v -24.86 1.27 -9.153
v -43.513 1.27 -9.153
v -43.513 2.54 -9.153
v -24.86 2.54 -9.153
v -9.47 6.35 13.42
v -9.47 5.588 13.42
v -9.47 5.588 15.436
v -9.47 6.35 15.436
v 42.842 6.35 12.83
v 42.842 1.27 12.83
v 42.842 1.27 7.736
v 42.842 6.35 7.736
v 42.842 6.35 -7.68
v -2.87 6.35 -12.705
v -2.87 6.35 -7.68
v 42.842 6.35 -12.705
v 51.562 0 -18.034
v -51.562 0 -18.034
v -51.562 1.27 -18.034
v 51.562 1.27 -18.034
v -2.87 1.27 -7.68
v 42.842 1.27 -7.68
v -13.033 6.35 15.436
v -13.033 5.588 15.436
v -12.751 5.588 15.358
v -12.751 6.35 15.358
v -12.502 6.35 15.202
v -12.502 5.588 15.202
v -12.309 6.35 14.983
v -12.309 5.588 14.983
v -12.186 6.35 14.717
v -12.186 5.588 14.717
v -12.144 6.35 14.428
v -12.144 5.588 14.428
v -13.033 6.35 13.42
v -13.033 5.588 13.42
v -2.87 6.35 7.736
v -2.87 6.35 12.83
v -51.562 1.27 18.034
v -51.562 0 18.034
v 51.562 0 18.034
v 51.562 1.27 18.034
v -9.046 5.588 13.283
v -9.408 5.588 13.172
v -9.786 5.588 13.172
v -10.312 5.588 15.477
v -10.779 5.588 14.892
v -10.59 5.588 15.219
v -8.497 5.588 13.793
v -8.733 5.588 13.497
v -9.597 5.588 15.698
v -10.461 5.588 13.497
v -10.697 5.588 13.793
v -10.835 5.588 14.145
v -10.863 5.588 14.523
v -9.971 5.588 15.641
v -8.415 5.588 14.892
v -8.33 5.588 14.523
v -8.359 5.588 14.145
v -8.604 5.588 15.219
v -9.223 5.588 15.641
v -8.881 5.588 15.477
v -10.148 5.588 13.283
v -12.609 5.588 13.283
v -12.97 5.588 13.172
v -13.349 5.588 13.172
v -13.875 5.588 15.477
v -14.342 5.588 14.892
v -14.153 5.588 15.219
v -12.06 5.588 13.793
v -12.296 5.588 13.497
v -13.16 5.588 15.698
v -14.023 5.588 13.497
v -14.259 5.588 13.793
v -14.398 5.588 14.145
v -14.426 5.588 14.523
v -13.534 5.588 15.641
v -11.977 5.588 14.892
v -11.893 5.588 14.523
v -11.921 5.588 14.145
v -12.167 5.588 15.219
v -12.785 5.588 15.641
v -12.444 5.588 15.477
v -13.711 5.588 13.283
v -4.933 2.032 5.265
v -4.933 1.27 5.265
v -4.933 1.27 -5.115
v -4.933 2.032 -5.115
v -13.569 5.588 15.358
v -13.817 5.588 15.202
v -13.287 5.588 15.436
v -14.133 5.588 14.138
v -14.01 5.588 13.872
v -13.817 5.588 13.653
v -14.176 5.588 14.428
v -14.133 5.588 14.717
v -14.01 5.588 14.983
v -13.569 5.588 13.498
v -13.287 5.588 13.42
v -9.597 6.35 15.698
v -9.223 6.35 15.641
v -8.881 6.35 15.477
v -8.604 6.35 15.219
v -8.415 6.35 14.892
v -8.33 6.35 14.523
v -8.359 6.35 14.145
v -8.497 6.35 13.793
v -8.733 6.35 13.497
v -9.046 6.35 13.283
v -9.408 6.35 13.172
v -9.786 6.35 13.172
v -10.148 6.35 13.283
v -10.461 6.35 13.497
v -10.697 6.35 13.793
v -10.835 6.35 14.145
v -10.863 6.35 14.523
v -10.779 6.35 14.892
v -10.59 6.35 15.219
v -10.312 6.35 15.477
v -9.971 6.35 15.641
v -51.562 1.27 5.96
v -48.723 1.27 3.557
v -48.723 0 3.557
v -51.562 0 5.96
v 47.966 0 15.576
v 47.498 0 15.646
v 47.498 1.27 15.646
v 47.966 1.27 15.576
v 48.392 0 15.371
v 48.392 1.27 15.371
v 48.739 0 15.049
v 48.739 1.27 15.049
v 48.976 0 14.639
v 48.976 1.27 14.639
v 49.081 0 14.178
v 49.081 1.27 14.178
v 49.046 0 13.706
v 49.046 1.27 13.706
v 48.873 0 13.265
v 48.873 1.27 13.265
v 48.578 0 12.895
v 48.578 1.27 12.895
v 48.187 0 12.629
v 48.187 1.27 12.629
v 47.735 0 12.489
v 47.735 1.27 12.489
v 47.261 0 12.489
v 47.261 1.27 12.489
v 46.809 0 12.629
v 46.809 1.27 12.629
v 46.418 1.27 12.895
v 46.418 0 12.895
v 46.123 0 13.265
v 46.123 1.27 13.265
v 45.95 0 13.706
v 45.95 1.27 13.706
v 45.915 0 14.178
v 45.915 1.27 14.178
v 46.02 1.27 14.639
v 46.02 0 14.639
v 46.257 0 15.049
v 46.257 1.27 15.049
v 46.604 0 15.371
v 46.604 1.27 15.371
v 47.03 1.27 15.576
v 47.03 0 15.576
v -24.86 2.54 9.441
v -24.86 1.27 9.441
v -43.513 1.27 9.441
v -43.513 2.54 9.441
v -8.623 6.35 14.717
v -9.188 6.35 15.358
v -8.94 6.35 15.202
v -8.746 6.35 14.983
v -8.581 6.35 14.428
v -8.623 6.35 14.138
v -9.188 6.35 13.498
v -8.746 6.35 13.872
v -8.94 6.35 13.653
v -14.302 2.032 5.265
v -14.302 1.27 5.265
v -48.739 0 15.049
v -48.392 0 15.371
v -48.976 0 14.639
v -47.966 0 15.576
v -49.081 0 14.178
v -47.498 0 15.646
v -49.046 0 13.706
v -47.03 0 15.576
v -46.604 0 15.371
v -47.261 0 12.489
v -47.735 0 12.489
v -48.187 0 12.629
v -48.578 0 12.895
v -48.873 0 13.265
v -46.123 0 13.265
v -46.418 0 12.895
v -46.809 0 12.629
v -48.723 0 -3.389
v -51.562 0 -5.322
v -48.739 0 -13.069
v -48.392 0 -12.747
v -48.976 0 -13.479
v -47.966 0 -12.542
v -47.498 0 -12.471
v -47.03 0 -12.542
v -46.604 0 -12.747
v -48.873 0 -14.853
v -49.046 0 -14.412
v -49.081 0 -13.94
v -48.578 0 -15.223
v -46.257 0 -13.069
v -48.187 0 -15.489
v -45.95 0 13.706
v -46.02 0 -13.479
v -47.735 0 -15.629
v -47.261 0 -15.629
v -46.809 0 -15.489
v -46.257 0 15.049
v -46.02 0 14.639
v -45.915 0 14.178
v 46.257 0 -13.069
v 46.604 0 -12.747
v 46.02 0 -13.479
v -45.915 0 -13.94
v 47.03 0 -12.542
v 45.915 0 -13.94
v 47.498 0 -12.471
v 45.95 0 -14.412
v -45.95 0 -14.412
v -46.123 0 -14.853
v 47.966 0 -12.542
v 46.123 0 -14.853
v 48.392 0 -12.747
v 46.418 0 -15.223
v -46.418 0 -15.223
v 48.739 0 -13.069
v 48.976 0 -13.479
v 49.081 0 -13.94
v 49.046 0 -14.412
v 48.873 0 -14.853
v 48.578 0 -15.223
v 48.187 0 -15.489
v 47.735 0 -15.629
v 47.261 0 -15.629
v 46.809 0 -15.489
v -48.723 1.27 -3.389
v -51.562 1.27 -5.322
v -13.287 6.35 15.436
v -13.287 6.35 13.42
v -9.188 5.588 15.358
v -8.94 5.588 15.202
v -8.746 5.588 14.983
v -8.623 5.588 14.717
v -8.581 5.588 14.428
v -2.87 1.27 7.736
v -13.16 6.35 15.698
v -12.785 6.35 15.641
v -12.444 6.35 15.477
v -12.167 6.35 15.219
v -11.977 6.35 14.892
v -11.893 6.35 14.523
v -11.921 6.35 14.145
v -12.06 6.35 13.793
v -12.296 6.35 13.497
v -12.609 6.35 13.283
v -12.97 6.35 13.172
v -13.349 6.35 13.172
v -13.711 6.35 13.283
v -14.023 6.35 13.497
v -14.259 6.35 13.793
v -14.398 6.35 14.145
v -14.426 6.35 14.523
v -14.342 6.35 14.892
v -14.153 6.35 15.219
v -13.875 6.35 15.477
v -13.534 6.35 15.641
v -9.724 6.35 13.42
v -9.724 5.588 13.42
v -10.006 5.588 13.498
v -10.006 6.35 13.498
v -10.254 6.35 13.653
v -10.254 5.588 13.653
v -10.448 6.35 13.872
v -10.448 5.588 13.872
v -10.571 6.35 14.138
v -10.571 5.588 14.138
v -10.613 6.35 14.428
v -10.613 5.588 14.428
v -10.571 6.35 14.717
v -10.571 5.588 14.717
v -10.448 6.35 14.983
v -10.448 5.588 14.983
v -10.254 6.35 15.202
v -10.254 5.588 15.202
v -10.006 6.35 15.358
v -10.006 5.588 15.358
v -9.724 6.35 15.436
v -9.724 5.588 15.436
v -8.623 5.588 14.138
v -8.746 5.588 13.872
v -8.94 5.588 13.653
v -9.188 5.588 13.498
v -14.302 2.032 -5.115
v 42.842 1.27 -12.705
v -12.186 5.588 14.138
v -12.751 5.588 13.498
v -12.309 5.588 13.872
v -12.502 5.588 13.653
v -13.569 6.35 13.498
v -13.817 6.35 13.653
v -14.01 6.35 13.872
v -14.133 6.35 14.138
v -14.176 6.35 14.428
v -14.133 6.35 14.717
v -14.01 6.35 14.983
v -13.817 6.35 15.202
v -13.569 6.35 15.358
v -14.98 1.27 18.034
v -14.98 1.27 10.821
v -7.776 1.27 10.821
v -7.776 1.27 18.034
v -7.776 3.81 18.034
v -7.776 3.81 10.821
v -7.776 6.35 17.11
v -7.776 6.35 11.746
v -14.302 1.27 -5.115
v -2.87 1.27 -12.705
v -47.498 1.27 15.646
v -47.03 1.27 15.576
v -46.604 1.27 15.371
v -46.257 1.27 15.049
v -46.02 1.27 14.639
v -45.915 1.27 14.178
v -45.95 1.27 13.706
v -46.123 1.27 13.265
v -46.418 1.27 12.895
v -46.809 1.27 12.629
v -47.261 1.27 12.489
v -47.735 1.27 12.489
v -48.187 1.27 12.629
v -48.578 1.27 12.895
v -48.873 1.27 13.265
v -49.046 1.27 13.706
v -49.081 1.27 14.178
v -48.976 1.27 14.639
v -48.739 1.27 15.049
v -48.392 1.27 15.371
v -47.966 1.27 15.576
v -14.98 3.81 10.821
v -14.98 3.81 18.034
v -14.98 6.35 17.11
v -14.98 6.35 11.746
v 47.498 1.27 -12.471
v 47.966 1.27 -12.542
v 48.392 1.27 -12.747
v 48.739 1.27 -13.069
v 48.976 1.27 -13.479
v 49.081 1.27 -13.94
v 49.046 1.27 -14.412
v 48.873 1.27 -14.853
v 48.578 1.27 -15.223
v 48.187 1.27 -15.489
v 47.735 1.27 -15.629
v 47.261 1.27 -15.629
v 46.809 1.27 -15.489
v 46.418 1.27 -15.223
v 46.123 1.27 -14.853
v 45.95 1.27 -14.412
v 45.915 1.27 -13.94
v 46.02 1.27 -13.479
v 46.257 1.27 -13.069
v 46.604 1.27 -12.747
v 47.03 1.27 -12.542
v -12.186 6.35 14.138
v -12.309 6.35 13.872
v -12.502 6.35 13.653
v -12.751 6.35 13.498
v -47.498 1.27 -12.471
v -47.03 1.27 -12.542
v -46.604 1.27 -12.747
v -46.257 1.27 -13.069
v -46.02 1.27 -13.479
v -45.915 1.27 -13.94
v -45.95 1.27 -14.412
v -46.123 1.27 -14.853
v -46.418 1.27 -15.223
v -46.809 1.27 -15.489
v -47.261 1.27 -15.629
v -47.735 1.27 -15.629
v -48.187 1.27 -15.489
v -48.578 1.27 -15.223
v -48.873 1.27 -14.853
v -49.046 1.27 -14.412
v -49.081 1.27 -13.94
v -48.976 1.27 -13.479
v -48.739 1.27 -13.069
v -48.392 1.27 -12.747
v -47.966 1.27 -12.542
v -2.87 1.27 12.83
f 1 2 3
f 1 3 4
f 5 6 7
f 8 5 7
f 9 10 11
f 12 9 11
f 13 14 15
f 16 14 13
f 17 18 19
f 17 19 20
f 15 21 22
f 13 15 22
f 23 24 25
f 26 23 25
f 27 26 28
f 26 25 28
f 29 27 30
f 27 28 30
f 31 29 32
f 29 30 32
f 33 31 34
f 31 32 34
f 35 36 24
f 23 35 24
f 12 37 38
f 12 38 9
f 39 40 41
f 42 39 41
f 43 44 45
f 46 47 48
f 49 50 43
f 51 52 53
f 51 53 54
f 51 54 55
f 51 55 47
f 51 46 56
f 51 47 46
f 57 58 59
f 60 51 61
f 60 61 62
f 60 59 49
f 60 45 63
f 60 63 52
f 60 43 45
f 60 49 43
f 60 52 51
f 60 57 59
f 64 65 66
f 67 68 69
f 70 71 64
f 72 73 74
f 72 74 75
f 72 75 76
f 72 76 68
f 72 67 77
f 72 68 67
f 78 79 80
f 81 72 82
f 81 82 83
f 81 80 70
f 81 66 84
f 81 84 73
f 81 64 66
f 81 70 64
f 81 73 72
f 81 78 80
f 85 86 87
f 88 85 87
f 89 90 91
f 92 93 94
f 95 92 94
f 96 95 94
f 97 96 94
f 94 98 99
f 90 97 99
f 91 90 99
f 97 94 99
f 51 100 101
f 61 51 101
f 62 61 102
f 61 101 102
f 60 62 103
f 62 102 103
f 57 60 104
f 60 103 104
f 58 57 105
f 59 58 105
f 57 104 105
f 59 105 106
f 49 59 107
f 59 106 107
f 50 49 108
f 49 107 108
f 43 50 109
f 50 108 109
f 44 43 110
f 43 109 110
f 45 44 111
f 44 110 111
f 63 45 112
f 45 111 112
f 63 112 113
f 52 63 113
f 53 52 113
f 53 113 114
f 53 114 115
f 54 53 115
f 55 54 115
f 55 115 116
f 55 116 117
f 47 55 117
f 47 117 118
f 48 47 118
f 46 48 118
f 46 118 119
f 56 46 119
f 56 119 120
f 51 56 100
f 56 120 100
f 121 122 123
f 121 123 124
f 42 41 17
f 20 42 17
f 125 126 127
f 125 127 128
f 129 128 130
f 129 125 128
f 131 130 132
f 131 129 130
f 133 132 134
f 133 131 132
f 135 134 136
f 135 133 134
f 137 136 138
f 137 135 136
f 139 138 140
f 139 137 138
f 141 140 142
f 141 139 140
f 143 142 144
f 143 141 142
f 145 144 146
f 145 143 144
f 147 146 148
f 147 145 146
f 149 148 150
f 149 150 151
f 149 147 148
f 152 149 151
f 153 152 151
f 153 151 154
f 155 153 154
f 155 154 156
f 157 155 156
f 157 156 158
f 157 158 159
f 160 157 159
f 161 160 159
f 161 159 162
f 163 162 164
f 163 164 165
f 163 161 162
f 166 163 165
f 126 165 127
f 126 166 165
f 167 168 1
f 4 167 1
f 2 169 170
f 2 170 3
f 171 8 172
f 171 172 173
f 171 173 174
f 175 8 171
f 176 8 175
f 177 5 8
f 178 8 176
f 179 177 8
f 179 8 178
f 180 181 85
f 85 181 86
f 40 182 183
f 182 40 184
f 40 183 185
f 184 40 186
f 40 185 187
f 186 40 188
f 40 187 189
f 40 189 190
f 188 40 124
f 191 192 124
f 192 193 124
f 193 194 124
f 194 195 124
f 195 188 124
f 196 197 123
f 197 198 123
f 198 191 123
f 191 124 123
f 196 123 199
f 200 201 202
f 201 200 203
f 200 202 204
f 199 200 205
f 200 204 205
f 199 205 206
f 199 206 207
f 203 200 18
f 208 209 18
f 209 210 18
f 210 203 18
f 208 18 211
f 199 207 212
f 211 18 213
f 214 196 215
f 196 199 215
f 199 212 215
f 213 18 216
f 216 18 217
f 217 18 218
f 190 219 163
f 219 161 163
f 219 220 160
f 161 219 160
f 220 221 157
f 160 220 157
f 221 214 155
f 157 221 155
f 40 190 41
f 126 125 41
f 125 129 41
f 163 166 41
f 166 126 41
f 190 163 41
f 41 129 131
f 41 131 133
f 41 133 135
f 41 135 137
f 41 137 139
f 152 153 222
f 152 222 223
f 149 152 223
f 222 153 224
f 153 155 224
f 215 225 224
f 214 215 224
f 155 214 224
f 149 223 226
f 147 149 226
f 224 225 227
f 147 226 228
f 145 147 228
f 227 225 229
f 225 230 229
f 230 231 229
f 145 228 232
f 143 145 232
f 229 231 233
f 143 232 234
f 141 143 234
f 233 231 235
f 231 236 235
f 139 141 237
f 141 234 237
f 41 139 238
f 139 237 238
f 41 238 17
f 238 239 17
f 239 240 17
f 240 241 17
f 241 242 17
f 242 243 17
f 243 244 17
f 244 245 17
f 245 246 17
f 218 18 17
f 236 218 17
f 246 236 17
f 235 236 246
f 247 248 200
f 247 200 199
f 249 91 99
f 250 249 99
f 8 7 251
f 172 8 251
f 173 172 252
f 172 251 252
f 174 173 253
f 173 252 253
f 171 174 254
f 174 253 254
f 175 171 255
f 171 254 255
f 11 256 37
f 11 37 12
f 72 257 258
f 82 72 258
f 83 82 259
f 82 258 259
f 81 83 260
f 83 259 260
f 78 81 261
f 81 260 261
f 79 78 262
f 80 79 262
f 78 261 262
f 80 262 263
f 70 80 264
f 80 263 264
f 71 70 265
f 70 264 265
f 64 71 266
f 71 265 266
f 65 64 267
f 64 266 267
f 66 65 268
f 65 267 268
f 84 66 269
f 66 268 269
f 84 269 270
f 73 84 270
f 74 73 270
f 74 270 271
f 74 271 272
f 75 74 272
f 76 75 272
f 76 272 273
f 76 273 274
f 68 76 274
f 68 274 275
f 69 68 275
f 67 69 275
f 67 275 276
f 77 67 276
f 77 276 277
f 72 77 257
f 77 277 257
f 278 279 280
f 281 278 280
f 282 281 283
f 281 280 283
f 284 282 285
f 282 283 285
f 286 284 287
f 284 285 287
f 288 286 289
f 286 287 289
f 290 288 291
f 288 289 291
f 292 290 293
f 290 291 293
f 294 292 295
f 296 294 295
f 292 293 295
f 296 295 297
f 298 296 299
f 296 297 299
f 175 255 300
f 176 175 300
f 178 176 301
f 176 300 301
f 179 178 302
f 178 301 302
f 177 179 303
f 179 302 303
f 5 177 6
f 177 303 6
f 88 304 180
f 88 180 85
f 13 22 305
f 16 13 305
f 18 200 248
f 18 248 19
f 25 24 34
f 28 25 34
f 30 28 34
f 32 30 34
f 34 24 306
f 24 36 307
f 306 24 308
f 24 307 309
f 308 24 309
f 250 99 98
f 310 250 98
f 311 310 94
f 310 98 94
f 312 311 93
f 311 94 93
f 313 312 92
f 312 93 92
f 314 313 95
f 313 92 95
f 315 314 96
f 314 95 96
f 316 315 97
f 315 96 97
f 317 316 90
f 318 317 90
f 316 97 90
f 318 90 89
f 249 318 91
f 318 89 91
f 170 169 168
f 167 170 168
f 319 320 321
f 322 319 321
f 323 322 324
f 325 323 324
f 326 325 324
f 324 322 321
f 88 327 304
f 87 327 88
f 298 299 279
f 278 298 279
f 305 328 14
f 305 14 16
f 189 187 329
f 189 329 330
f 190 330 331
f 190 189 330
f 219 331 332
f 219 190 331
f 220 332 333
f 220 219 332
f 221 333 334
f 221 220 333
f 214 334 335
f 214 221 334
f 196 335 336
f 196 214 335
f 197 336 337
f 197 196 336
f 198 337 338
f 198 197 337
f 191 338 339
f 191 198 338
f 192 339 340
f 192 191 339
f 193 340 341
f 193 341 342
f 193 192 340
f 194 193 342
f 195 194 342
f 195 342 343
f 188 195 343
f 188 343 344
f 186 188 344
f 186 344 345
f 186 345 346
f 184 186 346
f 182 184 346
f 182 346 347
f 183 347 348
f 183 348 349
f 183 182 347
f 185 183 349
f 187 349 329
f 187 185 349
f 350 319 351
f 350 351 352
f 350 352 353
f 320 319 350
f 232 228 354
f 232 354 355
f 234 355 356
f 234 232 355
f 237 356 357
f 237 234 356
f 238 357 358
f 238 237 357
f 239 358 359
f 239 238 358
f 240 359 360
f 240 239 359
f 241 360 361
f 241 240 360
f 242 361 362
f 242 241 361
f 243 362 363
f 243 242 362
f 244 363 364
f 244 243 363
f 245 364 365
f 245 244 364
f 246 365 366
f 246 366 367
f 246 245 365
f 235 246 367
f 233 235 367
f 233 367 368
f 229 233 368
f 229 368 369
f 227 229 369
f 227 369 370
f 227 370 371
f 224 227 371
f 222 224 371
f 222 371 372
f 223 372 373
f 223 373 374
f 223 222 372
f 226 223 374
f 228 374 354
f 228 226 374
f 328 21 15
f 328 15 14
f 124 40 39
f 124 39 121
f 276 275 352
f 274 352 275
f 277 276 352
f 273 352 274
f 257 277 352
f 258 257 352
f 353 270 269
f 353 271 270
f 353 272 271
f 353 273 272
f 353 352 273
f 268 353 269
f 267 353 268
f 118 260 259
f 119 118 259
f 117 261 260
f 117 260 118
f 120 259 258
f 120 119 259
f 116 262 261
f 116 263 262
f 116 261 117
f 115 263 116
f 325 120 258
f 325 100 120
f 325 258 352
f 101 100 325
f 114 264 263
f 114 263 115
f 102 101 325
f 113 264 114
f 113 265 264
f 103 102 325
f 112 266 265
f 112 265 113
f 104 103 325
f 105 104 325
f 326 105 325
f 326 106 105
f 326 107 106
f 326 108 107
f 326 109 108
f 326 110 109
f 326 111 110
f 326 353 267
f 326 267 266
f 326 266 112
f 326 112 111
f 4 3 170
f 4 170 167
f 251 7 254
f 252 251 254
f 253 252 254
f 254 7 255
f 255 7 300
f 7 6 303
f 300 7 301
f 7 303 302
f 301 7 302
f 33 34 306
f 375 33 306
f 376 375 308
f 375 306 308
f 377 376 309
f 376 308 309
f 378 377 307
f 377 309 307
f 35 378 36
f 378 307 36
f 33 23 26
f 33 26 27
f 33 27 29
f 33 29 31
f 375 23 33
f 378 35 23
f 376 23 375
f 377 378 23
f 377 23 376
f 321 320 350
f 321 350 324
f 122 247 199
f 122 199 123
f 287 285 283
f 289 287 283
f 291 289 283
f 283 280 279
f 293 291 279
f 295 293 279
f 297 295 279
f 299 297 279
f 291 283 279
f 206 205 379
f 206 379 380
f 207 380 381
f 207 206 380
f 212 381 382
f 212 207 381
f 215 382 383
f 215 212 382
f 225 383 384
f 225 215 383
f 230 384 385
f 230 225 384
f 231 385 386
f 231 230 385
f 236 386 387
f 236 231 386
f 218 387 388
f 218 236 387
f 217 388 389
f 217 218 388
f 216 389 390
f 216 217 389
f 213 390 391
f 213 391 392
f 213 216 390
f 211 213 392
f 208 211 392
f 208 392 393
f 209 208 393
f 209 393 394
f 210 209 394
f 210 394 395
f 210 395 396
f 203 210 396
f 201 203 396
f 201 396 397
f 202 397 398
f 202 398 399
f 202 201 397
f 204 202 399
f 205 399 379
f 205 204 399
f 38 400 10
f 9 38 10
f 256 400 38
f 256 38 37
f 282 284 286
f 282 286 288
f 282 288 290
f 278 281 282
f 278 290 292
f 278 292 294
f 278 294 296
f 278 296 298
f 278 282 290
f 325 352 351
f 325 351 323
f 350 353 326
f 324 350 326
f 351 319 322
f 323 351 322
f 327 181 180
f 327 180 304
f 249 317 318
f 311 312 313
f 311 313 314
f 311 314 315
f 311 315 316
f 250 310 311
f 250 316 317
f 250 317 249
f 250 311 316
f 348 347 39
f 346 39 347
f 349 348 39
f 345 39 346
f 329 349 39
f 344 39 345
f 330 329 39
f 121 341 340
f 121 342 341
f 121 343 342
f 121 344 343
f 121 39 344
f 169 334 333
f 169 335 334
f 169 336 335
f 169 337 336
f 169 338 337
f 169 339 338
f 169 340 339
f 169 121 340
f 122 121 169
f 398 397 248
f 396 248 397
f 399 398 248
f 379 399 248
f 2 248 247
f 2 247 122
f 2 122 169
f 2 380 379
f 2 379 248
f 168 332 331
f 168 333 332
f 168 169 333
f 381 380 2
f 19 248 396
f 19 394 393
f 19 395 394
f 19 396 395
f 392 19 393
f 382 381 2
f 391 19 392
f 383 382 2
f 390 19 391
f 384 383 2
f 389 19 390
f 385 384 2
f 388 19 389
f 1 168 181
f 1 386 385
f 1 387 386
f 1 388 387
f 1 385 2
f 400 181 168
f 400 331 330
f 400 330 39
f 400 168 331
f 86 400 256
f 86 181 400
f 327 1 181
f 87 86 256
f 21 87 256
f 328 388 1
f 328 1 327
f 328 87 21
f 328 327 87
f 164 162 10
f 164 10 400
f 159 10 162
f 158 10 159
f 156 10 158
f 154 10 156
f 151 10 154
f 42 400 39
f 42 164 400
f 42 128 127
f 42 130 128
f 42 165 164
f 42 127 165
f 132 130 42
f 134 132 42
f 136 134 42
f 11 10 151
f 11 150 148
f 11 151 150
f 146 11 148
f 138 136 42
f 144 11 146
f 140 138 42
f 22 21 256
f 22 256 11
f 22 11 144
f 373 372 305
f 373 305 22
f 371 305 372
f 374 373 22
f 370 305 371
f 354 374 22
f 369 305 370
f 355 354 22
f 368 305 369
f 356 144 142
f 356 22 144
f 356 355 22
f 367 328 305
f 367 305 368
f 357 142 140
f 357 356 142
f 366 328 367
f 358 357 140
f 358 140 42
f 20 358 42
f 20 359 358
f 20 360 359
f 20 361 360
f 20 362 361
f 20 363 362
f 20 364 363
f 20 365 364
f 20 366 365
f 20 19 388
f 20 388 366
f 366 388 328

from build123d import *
from OCP.BRepFilletAPI import BRepFilletAPI_MakeChamfer

# Parameters (mm, degrees)
SKETCH1_W              = 103.124
SKETCH1_H              = 36.068
SKETCH1_R              = 1.5875
BOSS_EXTRUDE2_DEPTH    = 1.27
CUT_EXTRUDE1_DEPTH     = 55.639526901
SKETCH3_W              = 18.652856935
SKETCH3_H              = 18.593657226
BOSS_EXTRUDE3_DEPTH    = 1.27
SKETCH4_W              = 9.368625717
SKETCH4_H              = 10.379996134
BOSS_EXTRUDE4_DEPTH    = 0.762
SKETCH5_W              = 45.711956493
SKETCH5_H              = 5.024947681
SKETCH5_H_2            = 5.093258644
BOSS_EXTRUDE6_DEPTH    = 5.08
SKETCH6_W              = 7.204415031
SKETCH6_H              = 7.212704243
BOSS_EXTRUDE8_DEPTH    = 5.08
CHAMFER1_SIZE          = 2.54
CHAMFER1_SIZE2         = 0.924484395
SKETCH7_R              = 1.27
CUT_EXTRUDE2_DEPTH     = 0.762
BOSS_EXTRUDE10_DEPTH   = 0.762
BOSS_EXTRUDE10_2_DEPTH = 0.762
BOSS_EXTRUDE10_3_DEPTH = 0.762
BOSS_EXTRUDE10_4_DEPTH = 0.762


with BuildPart() as part:
    # Sketch1 → Boss-Extrude2 (new body)
    with BuildSketch(Plane(origin=(0, 0, 0), x_dir=(1, 0, 0), z_dir=(0, 1, 0))):
        Rectangle(SKETCH1_W, SKETCH1_H)
        with Locations(Location((-47.498, 14.0589, 0), (0, 0, 270))):
            Circle(SKETCH1_R, mode=Mode.SUBTRACT)
        with Locations(Location((-47.498, -14.0589, 0), (0, 0, 270))):
            Circle(SKETCH1_R, mode=Mode.SUBTRACT)
        with Locations(Location((47.498, 14.0589, 0), (0, 0, 270))):
            Circle(SKETCH1_R, mode=Mode.SUBTRACT)
        with Locations(Location((47.498, -14.0589, 0), (0, 0, 270))):
            Circle(SKETCH1_R, mode=Mode.SUBTRACT)
    extrude(amount=BOSS_EXTRUDE2_DEPTH)

    # Sketch2 → Cut-Extrude1 (cut, through all)
    with BuildSketch(Plane(origin=(0, 1.27, 0), x_dir=(1, 0, 0), z_dir=(0, 1, 0))):
        Polygon((-51.562, 5.32151794), (-48.722589703, 3.389029994), (-48.722589703, -3.55748073), (-51.562, -5.960033311), align=None)
    extrude(amount=-CUT_EXTRUDE1_DEPTH, mode=Mode.SUBTRACT)

    # Sketch3 → Boss-Extrude3 (add)
    with BuildSketch(Plane(origin=(0, 1.27, 0), x_dir=(1, 0, 0), z_dir=(0, 1, 0))):
        with Locations((-34.186132532, -0.144079079)):
            Rectangle(SKETCH3_W, SKETCH3_H)
    extrude(amount=BOSS_EXTRUDE3_DEPTH)

    # Sketch4 → Boss-Extrude4 (add)
    with BuildSketch(Plane(origin=(0, 1.27, 0), x_dir=(1, 0, 0), z_dir=(0, 1, 0))):
        with Locations((-9.617295377, -0.075408878)):
            Rectangle(SKETCH4_W, SKETCH4_H)
    extrude(amount=BOSS_EXTRUDE4_DEPTH)

    # Sketch5 → Boss-Extrude6 (add)
    with BuildSketch(Plane(origin=(0, 1.27, 0), x_dir=(1, 0, 0), z_dir=(0, 1, 0))):
        with Locations((19.986043909, 10.19248885)):
            Rectangle(SKETCH5_W, SKETCH5_H)
        with Locations((19.986043909, -10.283017769)):
            Rectangle(SKETCH5_W, SKETCH5_H_2)
    extrude(amount=BOSS_EXTRUDE6_DEPTH)


with BuildPart() as body_2:
    # Sketch6 → Boss-Extrude8 (new body)
    with BuildSketch(Plane(origin=(0, 1.27, 0), x_dir=(1, 0, 0), z_dir=(0, 1, 0))):
        with Locations((-11.378263959, -14.427647879)):
            Rectangle(SKETCH6_W, SKETCH6_H)
    extrude(amount=BOSS_EXTRUDE8_DEPTH)

    # Chamfer1: one chamfer whose edges measure the first distance from different faces: ONE call of the kernel's chamfer builder (chamfer() names one face for all edges)
    chamfer1_edges_1 = [body_2.edges().sort_by_distance(p)[0] for p in [
        (-11.378263958, 6.35, 10.821295757),
    ]]
    chamfer1_side_1 = [body_2.faces().sort_by_distance(p)[0] for p in [
        (-11.378263958, 3.81, 10.821295757),
    ]]
    chamfer1_edges_2 = [body_2.edges().sort_by_distance(p)[0] for p in [
        (-11.378263958, 6.35, 18.034),
    ]]
    chamfer1_side_2 = [body_2.faces().sort_by_distance(p)[0] for p in [
        (-11.378263958, 3.81, 18.034),
    ]]
    chamfer1 = BRepFilletAPI_MakeChamfer(body_2.part.solid().wrapped)
    for e in chamfer1_edges_1:
        chamfer1.Add(CHAMFER1_SIZE, CHAMFER1_SIZE2, e.wrapped, chamfer1_side_1[0].wrapped)  # the first distance lies on this face
    for e in chamfer1_edges_2:
        chamfer1.Add(CHAMFER1_SIZE, CHAMFER1_SIZE2, e.wrapped, chamfer1_side_2[0].wrapped)  # the first distance lies on this face
    add(Compound.cast(chamfer1.Shape()), mode=Mode.REPLACE)

    # Sketch7 → Cut-Extrude2 (cut)
    with BuildSketch(Plane(origin=(0, 6.35, 0), x_dir=(1, 0, 0), z_dir=(0, 1, 0))):
        with Locations(Location((-13.159630139, -14.427647879, 0), (0, 0, 270))):
            Circle(SKETCH7_R)
        with Locations(Location((-9.596897778, -14.427647879, 0), (0, 0, 270))):
            Circle(SKETCH7_R)
    extrude(amount=-CUT_EXTRUDE2_DEPTH, mode=Mode.SUBTRACT)


with BuildPart() as body_3:
    # Sketch8 → Boss-Extrude10 (new body)
    with BuildSketch(Plane(origin=(0, 5.588, 0), x_dir=(1, 0, 0), z_dir=(0, 1, 0))):
        with BuildLine():
            Line((-13.286630139, -15.435679128), (-13.286630139, -13.419616629))
            ThreePointArc((-13.286630139, -13.419616629), (-14.175630139, -14.427647879), (-13.286630139, -15.435679128))
        make_face()
    extrude(amount=BOSS_EXTRUDE10_DEPTH)


with BuildPart() as body_4:
    # Sketch8 → Boss-Extrude10 2 (new body)
    with BuildSketch(Plane(origin=(0, 5.588, 0), x_dir=(1, 0, 0), z_dir=(0, 1, 0))):
        with BuildLine():
            ThreePointArc((-12.143630139, -14.427647879), (-12.397630139, -13.755627046), (-13.032630139, -13.419616629))
            Line((-13.032630139, -13.419616629), (-13.032630139, -15.435679128))
            ThreePointArc((-13.032630139, -15.435679128), (-12.397630139, -15.099668712), (-12.143630139, -14.427647879))
        make_face()
    extrude(amount=BOSS_EXTRUDE10_2_DEPTH)


with BuildPart() as body_5:
    # Sketch8 → Boss-Extrude10 3 (new body)
    with BuildSketch(Plane(origin=(0, 5.588, 0), x_dir=(1, 0, 0), z_dir=(0, 1, 0))):
        with BuildLine():
            ThreePointArc((-9.723897778, -13.419616629), (-10.612897778, -14.427647879), (-9.723897778, -15.435679128))
            Line((-9.723897778, -15.435679128), (-9.723897778, -13.419616629))
        make_face()
    extrude(amount=BOSS_EXTRUDE10_3_DEPTH)


with BuildPart() as body_6:
    # Sketch8 → Boss-Extrude10 4 (new body)
    with BuildSketch(Plane(origin=(0, 5.588, 0), x_dir=(1, 0, 0), z_dir=(0, 1, 0))):
        with BuildLine():
            Line((-9.469897778, -13.419616629), (-9.469897778, -15.435679128))
            ThreePointArc((-9.469897778, -15.435679128), (-8.834897778, -15.099668712), (-8.580897778, -14.427647879))
            ThreePointArc((-8.580897778, -14.427647879), (-8.834897778, -13.755627046), (-9.469897778, -13.419616629))
        make_face()
    extrude(amount=BOSS_EXTRUDE10_4_DEPTH)


solid = Compound([part.part, body_2.part, body_3.part, body_4.part, body_5.part, body_6.part])
